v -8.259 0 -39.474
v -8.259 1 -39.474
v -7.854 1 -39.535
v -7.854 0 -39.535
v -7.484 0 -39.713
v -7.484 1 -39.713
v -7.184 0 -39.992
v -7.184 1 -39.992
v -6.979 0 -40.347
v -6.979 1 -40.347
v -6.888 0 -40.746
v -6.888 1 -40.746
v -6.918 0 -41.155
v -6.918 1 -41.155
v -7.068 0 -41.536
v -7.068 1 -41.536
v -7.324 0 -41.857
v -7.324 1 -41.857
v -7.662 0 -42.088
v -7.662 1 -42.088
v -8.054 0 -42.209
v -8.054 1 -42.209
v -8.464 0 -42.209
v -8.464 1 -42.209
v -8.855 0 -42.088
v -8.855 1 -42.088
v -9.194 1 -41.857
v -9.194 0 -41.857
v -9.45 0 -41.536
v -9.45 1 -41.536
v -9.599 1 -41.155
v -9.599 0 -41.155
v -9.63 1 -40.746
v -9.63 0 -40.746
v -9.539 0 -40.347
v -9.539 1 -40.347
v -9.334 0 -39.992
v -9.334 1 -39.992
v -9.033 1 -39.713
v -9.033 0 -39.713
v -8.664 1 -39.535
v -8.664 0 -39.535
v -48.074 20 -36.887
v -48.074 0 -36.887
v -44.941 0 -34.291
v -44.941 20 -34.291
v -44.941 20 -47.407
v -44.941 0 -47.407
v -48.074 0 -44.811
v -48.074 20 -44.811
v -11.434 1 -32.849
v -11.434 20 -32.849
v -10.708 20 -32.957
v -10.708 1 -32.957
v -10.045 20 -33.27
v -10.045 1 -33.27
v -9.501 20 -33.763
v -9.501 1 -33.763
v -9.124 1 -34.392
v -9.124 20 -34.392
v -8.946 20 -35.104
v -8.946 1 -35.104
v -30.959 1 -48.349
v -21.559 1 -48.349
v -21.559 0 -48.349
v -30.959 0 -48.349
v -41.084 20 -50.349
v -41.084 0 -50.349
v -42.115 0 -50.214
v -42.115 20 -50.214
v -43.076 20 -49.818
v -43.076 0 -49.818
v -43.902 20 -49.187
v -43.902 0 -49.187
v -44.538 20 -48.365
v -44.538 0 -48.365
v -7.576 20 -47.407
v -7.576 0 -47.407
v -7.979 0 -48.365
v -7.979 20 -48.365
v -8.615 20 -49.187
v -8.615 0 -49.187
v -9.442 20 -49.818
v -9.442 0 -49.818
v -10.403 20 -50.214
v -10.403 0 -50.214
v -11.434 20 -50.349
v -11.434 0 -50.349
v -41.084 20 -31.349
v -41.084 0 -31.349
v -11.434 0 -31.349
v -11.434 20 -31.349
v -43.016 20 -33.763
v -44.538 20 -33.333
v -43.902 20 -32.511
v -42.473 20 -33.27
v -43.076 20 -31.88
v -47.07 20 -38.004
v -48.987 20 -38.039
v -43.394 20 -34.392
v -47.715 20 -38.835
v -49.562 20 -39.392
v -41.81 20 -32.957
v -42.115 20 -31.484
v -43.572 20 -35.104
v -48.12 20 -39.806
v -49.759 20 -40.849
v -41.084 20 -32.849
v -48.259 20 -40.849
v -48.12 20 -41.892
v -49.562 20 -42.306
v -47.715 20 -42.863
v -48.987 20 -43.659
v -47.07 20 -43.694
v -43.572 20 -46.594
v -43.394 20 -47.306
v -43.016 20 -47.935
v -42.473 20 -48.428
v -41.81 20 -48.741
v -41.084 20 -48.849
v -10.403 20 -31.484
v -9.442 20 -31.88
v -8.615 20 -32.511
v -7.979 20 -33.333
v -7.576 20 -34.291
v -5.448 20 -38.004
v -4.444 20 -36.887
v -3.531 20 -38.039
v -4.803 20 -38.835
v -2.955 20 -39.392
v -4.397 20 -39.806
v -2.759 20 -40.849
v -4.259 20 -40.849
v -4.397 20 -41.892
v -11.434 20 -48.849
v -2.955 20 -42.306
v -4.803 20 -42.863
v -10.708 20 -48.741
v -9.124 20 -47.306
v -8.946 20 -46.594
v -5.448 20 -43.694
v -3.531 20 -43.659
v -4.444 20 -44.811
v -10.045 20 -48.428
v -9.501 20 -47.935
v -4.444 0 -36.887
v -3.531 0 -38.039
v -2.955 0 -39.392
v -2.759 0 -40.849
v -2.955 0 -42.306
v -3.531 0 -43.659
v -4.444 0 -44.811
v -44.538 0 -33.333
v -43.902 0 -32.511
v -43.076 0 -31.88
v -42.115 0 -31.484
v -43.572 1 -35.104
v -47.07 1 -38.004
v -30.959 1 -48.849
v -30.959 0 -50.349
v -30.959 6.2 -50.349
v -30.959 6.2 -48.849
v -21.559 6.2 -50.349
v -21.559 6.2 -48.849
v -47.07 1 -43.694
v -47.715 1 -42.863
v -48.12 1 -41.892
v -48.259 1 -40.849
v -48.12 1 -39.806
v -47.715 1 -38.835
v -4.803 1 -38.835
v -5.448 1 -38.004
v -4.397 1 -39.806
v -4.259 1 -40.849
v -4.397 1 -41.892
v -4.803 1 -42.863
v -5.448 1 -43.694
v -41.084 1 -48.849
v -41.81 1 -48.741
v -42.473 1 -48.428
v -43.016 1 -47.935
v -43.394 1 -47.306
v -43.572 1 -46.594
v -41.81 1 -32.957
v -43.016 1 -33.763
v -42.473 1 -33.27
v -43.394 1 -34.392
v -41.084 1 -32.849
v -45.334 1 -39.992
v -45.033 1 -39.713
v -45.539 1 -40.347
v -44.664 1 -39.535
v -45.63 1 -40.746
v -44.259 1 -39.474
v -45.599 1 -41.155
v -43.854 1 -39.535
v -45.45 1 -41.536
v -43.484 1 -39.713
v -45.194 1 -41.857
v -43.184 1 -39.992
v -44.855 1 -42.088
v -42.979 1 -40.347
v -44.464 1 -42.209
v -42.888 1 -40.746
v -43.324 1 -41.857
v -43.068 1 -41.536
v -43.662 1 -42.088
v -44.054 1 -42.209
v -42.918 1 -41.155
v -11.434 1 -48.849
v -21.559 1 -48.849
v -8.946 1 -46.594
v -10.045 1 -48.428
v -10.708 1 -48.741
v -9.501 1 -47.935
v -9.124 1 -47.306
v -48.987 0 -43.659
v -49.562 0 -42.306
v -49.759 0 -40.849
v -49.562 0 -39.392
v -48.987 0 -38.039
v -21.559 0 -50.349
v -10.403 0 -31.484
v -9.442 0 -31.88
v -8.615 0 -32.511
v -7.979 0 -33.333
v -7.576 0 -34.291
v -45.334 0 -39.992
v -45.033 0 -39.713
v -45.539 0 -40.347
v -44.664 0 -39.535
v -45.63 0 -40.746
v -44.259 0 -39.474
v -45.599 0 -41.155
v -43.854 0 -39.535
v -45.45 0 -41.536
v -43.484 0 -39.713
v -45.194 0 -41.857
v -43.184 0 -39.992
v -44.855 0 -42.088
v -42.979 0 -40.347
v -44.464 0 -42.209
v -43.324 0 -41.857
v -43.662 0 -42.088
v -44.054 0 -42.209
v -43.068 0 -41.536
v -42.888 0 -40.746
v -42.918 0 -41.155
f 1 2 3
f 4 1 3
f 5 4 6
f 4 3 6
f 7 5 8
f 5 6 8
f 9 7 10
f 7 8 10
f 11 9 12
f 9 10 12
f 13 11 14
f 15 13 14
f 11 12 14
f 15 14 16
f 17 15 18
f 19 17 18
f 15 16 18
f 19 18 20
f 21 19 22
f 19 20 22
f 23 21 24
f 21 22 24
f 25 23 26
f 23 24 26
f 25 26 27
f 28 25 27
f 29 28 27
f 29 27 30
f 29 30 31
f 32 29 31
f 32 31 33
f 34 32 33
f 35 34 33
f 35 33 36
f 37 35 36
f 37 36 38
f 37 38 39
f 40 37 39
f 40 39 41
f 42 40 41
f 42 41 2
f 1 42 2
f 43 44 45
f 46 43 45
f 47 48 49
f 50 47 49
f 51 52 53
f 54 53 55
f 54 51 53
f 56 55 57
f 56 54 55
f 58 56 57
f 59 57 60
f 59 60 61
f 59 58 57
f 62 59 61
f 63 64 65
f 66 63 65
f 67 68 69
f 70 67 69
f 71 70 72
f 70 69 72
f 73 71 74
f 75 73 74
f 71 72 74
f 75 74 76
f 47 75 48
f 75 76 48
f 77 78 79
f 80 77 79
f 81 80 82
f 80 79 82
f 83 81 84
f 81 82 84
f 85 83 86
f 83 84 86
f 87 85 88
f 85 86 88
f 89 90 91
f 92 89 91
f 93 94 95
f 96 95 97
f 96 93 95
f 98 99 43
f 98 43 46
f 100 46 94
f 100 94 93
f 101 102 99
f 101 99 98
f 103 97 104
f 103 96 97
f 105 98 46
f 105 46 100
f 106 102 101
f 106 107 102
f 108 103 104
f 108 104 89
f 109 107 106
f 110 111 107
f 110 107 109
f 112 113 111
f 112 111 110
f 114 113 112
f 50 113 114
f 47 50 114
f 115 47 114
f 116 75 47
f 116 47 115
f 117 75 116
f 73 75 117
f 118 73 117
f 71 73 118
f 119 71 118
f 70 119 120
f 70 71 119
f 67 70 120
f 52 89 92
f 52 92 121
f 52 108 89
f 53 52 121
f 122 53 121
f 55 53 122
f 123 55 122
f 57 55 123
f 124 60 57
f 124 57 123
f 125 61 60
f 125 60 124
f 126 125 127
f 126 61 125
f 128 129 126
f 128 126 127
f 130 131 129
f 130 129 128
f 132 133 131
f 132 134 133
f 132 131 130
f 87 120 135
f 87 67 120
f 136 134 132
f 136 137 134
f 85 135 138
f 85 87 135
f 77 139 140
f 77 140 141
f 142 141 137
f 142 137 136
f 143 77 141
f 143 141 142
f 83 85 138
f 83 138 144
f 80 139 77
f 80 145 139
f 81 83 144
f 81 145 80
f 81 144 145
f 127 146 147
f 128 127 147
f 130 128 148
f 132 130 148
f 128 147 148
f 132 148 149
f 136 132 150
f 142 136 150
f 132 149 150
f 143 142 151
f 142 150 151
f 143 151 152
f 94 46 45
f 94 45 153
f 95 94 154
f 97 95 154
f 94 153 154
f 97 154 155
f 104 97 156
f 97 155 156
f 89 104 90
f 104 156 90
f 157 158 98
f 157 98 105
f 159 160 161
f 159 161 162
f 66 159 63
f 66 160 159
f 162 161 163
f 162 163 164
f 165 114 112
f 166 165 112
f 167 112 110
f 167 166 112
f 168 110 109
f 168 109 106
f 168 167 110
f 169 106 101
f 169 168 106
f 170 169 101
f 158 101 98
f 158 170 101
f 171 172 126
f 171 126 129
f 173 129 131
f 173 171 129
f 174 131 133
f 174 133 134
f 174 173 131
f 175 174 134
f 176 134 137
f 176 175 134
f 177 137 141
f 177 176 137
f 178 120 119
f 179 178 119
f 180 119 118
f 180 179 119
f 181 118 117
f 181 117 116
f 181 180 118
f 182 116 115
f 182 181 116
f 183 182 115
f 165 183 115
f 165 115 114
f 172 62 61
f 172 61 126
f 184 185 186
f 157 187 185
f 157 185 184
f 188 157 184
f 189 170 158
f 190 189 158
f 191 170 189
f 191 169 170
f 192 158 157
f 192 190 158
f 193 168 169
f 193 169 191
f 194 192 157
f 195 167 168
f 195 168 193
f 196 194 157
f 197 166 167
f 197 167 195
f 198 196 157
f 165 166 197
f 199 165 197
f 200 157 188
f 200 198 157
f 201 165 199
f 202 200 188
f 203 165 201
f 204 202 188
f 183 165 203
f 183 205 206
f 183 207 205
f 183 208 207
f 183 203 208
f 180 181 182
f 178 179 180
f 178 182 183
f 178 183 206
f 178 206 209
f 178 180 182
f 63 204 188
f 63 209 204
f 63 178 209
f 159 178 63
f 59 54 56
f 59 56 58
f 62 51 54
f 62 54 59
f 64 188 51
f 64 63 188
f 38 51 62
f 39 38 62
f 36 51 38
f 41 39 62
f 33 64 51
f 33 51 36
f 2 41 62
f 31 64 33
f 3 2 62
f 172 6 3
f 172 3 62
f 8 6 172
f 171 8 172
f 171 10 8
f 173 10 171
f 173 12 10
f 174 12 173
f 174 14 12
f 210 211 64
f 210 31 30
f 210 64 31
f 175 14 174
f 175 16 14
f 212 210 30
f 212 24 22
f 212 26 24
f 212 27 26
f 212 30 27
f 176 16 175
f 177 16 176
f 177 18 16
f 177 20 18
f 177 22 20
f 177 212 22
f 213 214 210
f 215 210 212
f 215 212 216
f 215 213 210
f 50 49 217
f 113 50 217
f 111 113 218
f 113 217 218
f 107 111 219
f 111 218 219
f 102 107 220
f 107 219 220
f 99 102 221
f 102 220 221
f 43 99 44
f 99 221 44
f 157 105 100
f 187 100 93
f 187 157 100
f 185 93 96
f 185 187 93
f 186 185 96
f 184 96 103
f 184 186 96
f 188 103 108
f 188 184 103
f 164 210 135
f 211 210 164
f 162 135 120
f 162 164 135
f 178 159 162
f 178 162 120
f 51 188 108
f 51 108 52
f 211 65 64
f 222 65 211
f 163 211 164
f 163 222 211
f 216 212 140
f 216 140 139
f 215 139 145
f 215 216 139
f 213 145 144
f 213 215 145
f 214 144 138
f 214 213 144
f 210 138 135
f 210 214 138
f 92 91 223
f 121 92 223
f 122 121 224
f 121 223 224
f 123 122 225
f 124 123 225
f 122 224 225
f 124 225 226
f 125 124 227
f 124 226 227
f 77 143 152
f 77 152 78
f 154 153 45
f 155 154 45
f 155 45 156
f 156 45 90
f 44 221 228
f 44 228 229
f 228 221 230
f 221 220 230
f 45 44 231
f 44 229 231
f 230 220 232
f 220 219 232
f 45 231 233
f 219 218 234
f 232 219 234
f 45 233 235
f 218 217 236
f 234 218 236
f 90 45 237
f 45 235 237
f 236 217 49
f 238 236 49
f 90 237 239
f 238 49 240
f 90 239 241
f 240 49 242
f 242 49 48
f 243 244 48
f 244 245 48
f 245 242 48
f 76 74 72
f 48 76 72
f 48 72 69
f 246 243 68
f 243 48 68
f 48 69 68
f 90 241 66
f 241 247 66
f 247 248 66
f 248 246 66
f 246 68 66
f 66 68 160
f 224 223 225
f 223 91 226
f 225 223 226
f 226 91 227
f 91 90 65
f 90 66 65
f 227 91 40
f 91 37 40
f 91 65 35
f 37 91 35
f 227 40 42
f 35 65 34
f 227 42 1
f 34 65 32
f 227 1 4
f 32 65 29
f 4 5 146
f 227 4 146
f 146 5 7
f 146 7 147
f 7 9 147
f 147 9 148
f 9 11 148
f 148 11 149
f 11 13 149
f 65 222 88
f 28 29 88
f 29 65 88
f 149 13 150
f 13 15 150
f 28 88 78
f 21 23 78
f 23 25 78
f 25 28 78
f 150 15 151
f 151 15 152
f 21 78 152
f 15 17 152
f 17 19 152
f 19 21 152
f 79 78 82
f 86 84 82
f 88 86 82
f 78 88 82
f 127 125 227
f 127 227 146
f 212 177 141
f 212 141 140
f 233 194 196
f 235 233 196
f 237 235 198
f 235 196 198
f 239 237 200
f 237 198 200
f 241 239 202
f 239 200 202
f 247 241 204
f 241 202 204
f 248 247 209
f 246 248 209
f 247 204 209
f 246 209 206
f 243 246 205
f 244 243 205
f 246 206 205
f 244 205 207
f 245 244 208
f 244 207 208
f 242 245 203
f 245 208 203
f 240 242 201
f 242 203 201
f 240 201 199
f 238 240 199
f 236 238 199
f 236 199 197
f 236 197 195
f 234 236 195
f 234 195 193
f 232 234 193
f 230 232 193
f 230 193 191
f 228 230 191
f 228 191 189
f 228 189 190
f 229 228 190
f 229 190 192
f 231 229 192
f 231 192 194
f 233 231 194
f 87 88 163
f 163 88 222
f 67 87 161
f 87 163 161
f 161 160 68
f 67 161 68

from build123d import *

# Parameters (mm, degrees)
BOSS_EXTRUDE1_DEPTH = 1
BOSS_EXTRUDE2_DEPTH = 20
CUT_EXTRUDE1_DEPTH  = 2
SKETCH3_R           = 1.175
CUT_EXTRUDE2_DEPTH  = 20
MOVE_FACE1_BY       = 0.2
MOVE_FACE1_2_BY     = 0.2
MOVE_FACE1_3_BY     = 0.2
MOVE_FACE1_4_BY     = 0.2
MOVE_FACE1_5_BY     = 0.2
MOVE_START          = 1
MOVE_FACE2_DEPTH    = 19


# Read off the part's stored shape, not the designer's step: Move Face2
with BuildPart() as part:
    # Sketch1 → Boss-Extrude1 (new body)
    with BuildSketch(Plane(origin=(0, 0, 0), x_dir=(1, 0, 0), z_dir=(0, 1, 0))):
        with BuildLine():
            Line((-11.433858941, 48.348949441), (-21.758858941, 48.348949441))
            Line((-21.758858941, 48.348949441), (-30.758858941, 48.348949441))
            Line((-30.758858941, 48.348949441), (-41.083858941, 48.348949441))
            ThreePointArc((-41.083858941, 48.348949441), (-42.498072504, 47.763163004), (-43.083858941, 46.348949441))
            Line((-43.083858941, 46.348949441), (-46.733732675, 43.323823175))
            ThreePointArc((-46.733732675, 43.323823175), (-47.758858941, 40.848949441), (-46.733732675, 38.374075707))
            Line((-46.733732675, 38.374075707), (-43.083858941, 35.348949441))
            ThreePointArc((-43.083858941, 35.348949441), (-42.498072504, 33.934735879), (-41.083858941, 33.348949441))
            Line((-41.083858941, 33.348949441), (-11.433858941, 33.348949441))
            ThreePointArc((-11.433858941, 33.348949441), (-10.019645379, 33.934735879), (-9.433858941, 35.348949441))
            Line((-9.433858941, 35.348949441), (-5.783985207, 38.374075707))
            ThreePointArc((-5.783985207, 38.374075707), (-4.758858941, 40.848949441), (-5.783985207, 43.323823175))
            Line((-5.783985207, 43.323823175), (-9.433858941, 46.348949441))
            ThreePointArc((-9.433858941, 46.348949441), (-10.019645379, 47.763163004), (-11.433858941, 48.348949441))
        make_face()
    extrude(amount=BOSS_EXTRUDE1_DEPTH)

    # Sketch1<3> → Boss-Extrude2 (add)
    with BuildSketch(Plane(origin=(0, 0, 0), x_dir=(1, 0, 0), z_dir=(0, 1, 0))):
        with BuildLine():
            Line((-21.758858941, 50.348949441), (-30.758858941, 50.348949441))
            Line((-30.758858941, 50.348949441), (-41.083858941, 50.348949441))
            ThreePointArc((-41.083858941, 50.348949441), (-43.509516051, 49.529544917), (-44.941375957, 47.407043233))
            Line((-44.941375957, 47.407043233), (-48.073804253, 44.810791471))
            ThreePointArc((-48.073804253, 44.810791471), (-49.758858941, 40.848949441), (-48.073804253, 36.887107411))
            Line((-48.073804253, 36.887107411), (-44.941375957, 34.290855649))
            ThreePointArc((-44.941375957, 34.290855649), (-43.509516051, 32.168353965), (-41.083858941, 31.348949441))
            Line((-41.083858941, 31.348949441), (-11.433858941, 31.348949441))
            ThreePointArc((-11.433858941, 31.348949441), (-9.008201831, 32.168353965), (-7.576341925, 34.290855649))
            Line((-7.576341925, 34.290855649), (-4.443913629, 36.887107411))
            ThreePointArc((-4.443913629, 36.887107411), (-2.758858941, 40.848949441), (-4.443913629, 44.810791471))
            Line((-4.443913629, 44.810791471), (-7.576341925, 47.407043233))
            ThreePointArc((-7.576341925, 47.407043233), (-9.008201831, 49.529544917), (-11.433858941, 50.348949441))
            Line((-11.433858941, 50.348949441), (-21.758858941, 50.348949441))
        make_face()
        with BuildLine():
            Line((-11.433858941, 48.348949441), (-21.758858941, 48.348949441))
            Line((-21.758858941, 48.348949441), (-30.758858941, 48.348949441))
            Line((-30.758858941, 48.348949441), (-41.083858941, 48.348949441))
            ThreePointArc((-41.083858941, 48.348949441), (-42.498072504, 47.763163004), (-43.083858941, 46.348949441))
            Line((-43.083858941, 46.348949441), (-46.733732675, 43.323823175))
            ThreePointArc((-46.733732675, 43.323823175), (-47.758858941, 40.848949441), (-46.733732675, 38.374075707))
            Line((-46.733732675, 38.374075707), (-43.083858941, 35.348949441))
            ThreePointArc((-43.083858941, 35.348949441), (-42.498072504, 33.934735879), (-41.083858941, 33.348949441))
            Line((-41.083858941, 33.348949441), (-11.433858941, 33.348949441))
            ThreePointArc((-11.433858941, 33.348949441), (-10.019645379, 33.934735879), (-9.433858941, 35.348949441))
            Line((-9.433858941, 35.348949441), (-5.783985207, 38.374075707))
            ThreePointArc((-5.783985207, 38.374075707), (-4.758858941, 40.848949441), (-5.783985207, 43.323823175))
            Line((-5.783985207, 43.323823175), (-9.433858941, 46.348949441))
            ThreePointArc((-9.433858941, 46.348949441), (-10.019645379, 47.763163004), (-11.433858941, 48.348949441))
        make_face(mode=Mode.SUBTRACT)
    extrude(amount=BOSS_EXTRUDE2_DEPTH)

    # Sketch2 → Cut-Extrude1 (cut)
    with BuildSketch(Plane.XY.offset(-50.348949441)):
        Polygon((-21.758858941, 1), (-21.758858941, 6), (-30.758858941, 6), (-30.758858941, 1), (-30.758858941, 0), (-21.758858941, 0), align=None)
    extrude(amount=CUT_EXTRUDE1_DEPTH, mode=Mode.SUBTRACT)

    # Sketch3 → Cut-Extrude2 (cut)
    with BuildSketch(Plane(origin=(0, 1, 0), x_dir=(1, 0, 0), z_dir=(0, 1, 0))):
        with Locations(Location((-8.258858941, 40.848949441, 0), (0, 0, 270))):
            Circle(SKETCH3_R)
        with Locations(Location((-44.258858941, 40.848949441, 0), (0, 0, 270))):
            Circle(SKETCH3_R)
    extrude(amount=-CUT_EXTRUDE2_DEPTH, mode=Mode.SUBTRACT)

    # Move Face1: a face moved inward by 0.2
    extrude(part.faces().sort_by_distance((-26.258858941, 6, -49.348949441))[0], amount=MOVE_FACE1_BY, dir=(0, 1, 0), mode=Mode.SUBTRACT)

    # Move Face1 2: a face moved inward by 0.2
    extrude(part.faces().sort_by_distance((-30.758858941, 3, -49.348949441))[0], amount=MOVE_FACE1_2_BY, dir=(-1, 0, 0), mode=Mode.SUBTRACT)

    # Move Face1 3: a face moved inward by 0.2
    extrude(part.faces().sort_by_distance((-21.758858941, 3, -49.348949441))[0], amount=MOVE_FACE1_3_BY, dir=(1, 0, 0), mode=Mode.SUBTRACT)

    # Move Face1 4: a curved face moved inward by 0.2
    add(Solid.thicken(part.faces().sort_by_distance((-44.258858941, 0.5, -42.023949441))[0], -MOVE_FACE1_4_BY), mode=Mode.SUBTRACT)

    # Move Face1 5: a curved face moved inward by 0.2
    add(Solid.thicken(part.faces().sort_by_distance((-8.258858941, 0.5, -42.023949441))[0], -MOVE_FACE1_5_BY), mode=Mode.SUBTRACT)

    # Move Face2 outline → Move Face2 (cut)
    with BuildSketch(Plane(origin=(0, 0, 0), x_dir=(1, 0, 0), z_dir=(0, 1, 0)).offset(MOVE_START)):
        with BuildLine():
            ThreePointArc((-41.083858941, 48.848949441), (-42.762782817, 48.201303246), (-43.571827765, 46.593921137))
            Line((-43.571827765, 46.593921137), (-47.070175615, 43.694384128))
            ThreePointArc((-47.070175615, 43.694384128), (-48.258858941, 40.848949441), (-47.070175615, 38.003514754))
            Line((-47.070175615, 38.003514754), (-43.571827765, 35.103977746))
            ThreePointArc((-43.571827765, 35.103977746), (-42.762782817, 33.496595636), (-41.083858941, 32.848949441))
            Line((-41.083858941, 32.848949441), (-11.433858941, 32.848949441))
            ThreePointArc((-11.433858941, 32.848949441), (-9.754935065, 33.496595636), (-8.945890117, 35.103977746))
            Line((-8.945890117, 35.103977746), (-5.447542267, 38.003514754))
            ThreePointArc((-5.447542267, 38.003514754), (-4.258858941, 40.848949441), (-5.447542267, 43.694384128))
            Line((-5.447542267, 43.694384128), (-8.945890117, 46.593921137))
            ThreePointArc((-8.945890117, 46.593921137), (-9.754935065, 48.201303246), (-11.433858941, 48.848949441))
            Line((-11.433858941, 48.848949441), (-41.083858941, 48.848949441))
        make_face()
        with BuildLine():
            Line((-41.083858941, 48.348949441), (-11.433858941, 48.348949441))
            ThreePointArc((-11.433858941, 48.348949441), (-10.019645379, 47.763163004), (-9.433858941, 46.348949441))
            Line((-9.433858941, 46.348949441), (-5.783985207, 43.323823175))
            ThreePointArc((-5.783985207, 43.323823175), (-4.758858941, 40.848949441), (-5.783985207, 38.374075707))
            Line((-5.783985207, 38.374075707), (-9.433858941, 35.348949441))
            ThreePointArc((-9.433858941, 35.348949441), (-10.019645379, 33.934735879), (-11.433858941, 33.348949441))
            Line((-11.433858941, 33.348949441), (-41.083858941, 33.348949441))
            ThreePointArc((-41.083858941, 33.348949441), (-42.498072504, 33.934735879), (-43.083858941, 35.348949441))
            Line((-43.083858941, 35.348949441), (-46.733732675, 38.374075707))
            ThreePointArc((-46.733732675, 38.374075707), (-47.758858941, 40.848949441), (-46.733732675, 43.323823175))
            Line((-46.733732675, 43.323823175), (-43.083858941, 46.348949441))
            ThreePointArc((-43.083858941, 46.348949441), (-42.498072504, 47.763163004), (-41.083858941, 48.348949441))
        make_face(mode=Mode.SUBTRACT)
    extrude(amount=MOVE_FACE2_DEPTH, mode=Mode.SUBTRACT)


solid = part.part
